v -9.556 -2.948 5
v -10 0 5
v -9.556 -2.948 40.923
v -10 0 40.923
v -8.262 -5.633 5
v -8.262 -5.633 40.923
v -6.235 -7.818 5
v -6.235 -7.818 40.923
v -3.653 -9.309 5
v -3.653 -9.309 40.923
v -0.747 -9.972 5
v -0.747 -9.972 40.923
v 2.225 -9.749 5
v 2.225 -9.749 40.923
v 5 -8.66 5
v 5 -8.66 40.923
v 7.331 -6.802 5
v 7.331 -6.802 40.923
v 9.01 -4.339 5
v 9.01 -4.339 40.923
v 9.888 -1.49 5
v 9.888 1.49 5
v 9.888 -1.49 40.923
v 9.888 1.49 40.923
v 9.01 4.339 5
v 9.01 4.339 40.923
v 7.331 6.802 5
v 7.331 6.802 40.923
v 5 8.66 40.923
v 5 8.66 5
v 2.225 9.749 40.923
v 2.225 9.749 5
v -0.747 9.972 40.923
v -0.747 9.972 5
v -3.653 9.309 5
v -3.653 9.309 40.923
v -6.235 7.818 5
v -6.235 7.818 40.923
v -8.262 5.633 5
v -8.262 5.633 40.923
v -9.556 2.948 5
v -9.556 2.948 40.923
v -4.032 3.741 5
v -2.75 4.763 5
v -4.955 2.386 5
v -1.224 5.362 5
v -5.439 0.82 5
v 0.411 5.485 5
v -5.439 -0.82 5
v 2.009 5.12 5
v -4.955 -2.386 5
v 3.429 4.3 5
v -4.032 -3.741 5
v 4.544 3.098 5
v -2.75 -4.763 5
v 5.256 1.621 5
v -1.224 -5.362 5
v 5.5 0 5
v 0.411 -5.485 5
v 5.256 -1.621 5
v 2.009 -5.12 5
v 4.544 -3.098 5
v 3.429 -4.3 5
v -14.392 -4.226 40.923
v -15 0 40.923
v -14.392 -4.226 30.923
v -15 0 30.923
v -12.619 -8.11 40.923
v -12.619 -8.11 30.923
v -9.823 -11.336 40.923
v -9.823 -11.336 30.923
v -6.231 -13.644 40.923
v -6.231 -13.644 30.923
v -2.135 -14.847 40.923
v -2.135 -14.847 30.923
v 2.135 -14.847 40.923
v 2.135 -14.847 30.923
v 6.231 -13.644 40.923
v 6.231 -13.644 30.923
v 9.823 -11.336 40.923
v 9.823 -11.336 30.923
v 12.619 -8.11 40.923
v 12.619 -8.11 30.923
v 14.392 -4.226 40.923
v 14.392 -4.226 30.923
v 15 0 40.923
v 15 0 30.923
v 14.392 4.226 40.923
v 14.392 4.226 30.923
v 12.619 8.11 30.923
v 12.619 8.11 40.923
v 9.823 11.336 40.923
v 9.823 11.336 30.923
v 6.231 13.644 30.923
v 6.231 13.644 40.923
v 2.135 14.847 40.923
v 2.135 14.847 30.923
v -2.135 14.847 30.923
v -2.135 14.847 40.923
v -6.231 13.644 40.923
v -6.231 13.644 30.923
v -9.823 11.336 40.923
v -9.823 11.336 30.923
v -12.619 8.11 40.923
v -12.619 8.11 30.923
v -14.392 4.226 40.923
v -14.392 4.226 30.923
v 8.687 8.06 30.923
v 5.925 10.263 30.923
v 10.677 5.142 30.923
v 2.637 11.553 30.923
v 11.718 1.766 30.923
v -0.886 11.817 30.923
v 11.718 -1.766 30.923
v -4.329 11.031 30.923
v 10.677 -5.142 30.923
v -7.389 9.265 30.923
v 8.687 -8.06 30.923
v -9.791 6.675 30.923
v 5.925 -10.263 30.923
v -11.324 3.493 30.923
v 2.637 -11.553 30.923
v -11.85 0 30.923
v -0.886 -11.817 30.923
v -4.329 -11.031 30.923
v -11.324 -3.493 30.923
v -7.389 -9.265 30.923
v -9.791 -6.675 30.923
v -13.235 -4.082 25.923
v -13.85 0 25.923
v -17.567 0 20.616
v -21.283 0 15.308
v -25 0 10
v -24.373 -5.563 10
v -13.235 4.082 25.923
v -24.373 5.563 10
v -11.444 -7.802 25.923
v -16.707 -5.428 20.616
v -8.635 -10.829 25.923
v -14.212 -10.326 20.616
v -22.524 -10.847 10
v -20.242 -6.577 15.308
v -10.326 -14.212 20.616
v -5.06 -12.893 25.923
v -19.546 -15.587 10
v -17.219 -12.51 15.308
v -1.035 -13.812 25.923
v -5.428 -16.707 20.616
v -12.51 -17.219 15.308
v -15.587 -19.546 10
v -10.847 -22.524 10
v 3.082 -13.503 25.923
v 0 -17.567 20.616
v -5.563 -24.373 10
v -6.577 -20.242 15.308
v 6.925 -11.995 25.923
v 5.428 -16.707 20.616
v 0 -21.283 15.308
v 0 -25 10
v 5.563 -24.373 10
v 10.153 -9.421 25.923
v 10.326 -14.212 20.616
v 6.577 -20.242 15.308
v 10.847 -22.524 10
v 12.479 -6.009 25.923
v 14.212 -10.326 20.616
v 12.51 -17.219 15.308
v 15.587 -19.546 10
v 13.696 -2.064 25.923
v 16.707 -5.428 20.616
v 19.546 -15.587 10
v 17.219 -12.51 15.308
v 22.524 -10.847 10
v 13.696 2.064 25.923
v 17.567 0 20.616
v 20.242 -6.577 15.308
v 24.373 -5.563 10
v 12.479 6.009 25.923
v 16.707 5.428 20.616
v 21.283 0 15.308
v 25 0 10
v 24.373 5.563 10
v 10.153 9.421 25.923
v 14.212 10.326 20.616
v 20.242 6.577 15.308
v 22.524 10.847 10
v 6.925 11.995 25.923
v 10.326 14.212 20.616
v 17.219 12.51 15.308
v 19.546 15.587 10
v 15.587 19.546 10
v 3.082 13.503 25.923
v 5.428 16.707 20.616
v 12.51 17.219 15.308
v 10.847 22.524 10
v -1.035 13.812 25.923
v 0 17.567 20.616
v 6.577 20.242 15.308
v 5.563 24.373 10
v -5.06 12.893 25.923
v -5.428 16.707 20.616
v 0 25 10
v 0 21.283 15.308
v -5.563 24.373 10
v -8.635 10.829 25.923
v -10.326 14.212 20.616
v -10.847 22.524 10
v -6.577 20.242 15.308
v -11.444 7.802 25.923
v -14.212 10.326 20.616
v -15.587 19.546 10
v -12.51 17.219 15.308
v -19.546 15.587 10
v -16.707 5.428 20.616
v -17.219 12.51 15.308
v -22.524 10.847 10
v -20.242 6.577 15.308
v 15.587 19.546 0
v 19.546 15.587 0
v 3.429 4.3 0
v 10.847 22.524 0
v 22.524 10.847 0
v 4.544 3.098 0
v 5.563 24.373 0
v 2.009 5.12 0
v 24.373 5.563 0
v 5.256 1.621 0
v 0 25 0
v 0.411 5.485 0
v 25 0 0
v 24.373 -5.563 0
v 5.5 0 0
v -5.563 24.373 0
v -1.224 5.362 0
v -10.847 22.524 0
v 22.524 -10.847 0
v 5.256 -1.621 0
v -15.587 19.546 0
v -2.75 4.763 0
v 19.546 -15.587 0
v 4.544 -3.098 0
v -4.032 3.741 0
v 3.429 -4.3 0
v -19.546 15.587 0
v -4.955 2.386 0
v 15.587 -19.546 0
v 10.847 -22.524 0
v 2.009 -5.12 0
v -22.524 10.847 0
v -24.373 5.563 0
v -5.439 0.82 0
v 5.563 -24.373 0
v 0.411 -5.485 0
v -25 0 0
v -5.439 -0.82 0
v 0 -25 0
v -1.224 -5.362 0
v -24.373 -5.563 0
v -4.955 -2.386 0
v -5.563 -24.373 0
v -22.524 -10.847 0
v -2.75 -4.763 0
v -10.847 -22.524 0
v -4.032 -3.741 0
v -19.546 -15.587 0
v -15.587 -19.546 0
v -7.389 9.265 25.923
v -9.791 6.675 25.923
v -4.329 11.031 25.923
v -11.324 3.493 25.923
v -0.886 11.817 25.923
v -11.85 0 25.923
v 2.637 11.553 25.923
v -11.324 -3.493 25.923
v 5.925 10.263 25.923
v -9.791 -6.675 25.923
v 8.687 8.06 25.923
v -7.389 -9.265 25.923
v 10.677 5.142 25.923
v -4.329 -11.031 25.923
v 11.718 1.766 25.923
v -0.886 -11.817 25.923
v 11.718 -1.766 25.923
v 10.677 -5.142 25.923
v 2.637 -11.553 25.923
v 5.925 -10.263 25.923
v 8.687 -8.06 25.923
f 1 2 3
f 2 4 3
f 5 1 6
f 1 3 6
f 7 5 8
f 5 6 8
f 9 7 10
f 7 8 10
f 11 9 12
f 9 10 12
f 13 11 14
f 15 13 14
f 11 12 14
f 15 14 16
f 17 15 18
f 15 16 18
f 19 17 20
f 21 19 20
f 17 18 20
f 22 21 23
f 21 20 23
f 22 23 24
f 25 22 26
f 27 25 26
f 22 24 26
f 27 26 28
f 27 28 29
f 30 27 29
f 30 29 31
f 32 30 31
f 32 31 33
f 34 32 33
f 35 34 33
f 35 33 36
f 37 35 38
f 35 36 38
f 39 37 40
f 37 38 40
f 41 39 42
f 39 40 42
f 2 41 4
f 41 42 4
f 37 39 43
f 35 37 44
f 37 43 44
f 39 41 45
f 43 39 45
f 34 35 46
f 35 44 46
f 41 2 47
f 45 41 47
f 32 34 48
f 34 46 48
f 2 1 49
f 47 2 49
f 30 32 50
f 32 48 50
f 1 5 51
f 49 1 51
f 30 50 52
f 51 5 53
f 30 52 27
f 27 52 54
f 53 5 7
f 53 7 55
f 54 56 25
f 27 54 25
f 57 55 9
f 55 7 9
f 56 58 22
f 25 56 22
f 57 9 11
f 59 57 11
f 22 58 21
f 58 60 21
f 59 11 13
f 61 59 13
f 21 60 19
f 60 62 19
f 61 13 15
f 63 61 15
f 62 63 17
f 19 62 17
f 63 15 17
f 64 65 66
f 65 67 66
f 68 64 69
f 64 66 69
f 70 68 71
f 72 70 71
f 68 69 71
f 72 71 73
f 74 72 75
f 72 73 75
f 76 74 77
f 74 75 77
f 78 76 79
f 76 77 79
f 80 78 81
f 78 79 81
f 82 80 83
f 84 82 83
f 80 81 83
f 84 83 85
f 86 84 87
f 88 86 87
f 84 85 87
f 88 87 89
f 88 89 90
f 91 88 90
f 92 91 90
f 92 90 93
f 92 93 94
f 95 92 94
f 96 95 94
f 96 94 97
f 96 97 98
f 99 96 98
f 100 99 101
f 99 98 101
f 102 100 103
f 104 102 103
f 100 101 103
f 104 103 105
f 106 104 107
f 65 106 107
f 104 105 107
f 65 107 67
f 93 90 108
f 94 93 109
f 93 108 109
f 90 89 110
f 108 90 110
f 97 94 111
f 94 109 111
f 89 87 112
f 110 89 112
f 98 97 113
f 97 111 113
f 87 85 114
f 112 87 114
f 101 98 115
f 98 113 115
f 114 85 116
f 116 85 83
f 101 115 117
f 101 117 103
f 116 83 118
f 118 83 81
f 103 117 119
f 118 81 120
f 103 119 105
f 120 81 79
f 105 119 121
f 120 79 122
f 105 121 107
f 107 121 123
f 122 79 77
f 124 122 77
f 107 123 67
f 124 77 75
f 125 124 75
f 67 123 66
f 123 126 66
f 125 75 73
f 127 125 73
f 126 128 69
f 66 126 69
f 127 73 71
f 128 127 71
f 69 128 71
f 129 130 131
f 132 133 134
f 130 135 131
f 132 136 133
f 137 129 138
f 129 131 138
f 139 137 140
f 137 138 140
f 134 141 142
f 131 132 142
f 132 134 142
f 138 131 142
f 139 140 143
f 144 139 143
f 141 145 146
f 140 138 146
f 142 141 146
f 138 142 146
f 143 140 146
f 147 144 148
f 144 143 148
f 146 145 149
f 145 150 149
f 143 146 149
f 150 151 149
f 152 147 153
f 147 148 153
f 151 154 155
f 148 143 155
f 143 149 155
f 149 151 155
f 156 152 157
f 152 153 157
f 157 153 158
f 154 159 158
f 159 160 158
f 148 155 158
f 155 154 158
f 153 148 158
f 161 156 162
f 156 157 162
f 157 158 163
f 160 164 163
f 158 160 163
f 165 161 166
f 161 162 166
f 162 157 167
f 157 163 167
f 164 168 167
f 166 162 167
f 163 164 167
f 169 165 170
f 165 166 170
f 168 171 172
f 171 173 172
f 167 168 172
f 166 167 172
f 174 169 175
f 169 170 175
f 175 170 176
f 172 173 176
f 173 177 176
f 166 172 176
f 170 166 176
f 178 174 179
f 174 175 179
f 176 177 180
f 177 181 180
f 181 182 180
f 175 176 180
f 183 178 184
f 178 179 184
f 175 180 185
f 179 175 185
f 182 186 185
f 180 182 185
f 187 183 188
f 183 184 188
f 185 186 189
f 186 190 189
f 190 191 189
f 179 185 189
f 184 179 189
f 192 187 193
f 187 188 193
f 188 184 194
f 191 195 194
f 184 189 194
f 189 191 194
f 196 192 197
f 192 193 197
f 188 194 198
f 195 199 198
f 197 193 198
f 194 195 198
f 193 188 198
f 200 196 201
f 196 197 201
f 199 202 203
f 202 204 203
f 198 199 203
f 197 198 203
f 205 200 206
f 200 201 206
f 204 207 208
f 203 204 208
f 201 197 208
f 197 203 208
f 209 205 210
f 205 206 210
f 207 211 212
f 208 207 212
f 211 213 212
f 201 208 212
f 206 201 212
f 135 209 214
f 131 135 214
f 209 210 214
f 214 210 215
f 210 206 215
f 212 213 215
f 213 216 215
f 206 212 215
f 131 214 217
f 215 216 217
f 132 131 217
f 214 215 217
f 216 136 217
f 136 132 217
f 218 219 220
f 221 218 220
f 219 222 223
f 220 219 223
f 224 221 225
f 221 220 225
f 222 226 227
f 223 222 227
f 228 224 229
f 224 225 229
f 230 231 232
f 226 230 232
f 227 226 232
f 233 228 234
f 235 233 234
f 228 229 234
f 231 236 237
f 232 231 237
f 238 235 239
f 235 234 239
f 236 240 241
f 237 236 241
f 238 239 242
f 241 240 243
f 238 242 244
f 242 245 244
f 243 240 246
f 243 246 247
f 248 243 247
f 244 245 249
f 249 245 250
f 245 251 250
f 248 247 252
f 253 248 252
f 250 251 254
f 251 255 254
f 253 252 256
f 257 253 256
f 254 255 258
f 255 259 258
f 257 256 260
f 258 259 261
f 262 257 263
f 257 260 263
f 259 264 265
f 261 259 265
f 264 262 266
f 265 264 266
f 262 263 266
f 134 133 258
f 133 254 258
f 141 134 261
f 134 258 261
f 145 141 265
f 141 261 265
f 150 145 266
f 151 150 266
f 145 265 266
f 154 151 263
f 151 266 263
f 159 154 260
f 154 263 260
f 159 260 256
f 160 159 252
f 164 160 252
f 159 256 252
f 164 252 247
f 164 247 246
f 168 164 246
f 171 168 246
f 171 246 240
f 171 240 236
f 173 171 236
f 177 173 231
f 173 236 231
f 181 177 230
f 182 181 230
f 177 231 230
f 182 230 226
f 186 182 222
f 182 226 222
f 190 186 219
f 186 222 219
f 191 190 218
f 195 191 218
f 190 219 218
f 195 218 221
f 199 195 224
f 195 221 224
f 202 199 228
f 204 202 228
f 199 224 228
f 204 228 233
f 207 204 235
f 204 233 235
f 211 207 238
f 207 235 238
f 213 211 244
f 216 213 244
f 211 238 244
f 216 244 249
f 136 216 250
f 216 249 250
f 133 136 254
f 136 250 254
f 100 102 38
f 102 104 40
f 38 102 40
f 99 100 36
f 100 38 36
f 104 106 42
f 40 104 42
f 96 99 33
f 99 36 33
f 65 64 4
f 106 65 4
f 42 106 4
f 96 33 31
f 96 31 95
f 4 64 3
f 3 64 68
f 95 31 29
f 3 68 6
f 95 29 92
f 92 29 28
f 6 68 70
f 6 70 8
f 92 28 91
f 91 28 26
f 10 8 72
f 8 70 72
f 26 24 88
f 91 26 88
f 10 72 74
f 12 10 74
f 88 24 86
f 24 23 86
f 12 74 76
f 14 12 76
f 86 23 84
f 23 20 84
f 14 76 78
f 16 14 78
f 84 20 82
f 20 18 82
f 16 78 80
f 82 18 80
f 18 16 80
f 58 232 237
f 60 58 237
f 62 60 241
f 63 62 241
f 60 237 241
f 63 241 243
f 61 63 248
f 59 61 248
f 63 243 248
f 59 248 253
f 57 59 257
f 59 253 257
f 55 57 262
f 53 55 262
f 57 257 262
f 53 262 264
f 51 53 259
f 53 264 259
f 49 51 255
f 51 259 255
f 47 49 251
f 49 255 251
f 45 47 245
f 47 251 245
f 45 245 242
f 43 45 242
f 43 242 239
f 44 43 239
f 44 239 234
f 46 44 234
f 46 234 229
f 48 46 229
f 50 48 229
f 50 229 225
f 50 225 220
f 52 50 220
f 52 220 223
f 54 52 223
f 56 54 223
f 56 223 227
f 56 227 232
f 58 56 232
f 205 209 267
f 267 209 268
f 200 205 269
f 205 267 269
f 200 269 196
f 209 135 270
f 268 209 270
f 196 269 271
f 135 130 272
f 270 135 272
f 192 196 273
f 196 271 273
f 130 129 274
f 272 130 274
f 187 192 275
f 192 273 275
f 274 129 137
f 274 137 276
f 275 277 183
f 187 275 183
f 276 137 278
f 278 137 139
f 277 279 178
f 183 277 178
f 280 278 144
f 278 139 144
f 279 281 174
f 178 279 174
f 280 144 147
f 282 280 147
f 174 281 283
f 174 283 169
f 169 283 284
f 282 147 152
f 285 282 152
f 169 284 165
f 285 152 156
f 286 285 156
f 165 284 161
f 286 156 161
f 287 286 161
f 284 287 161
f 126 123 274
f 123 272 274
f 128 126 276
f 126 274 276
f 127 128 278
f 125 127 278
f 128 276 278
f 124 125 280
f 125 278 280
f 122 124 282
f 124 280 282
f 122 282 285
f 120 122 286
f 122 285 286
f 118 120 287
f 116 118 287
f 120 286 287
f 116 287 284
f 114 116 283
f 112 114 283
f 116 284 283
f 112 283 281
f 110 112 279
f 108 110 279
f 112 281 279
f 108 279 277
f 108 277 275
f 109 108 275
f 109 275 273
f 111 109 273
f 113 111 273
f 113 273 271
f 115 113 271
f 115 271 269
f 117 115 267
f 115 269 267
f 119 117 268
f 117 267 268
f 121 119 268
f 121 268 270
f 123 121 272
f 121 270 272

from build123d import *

# Parameters (mm, degrees)
F2_R     = 5.5
F3_DEPTH = 25


with BuildPart() as f1:
    # F0 (on Front) → F1 (revolve)
    with BuildSketch(Plane.XZ):
        Polygon((-25, 0), (0, 0), (0, 5), (-10, 5), (-10, 40.923497), (-15, 40.923497), (-15, 30.923497), (-11.850247, 30.923497), (-11.850247, 25.923497), (-13.850247, 25.923497), (-25, 10), align=None)
    revolve(axis=Axis((0, 0, 25), (0, 0, 1)))

    # F2 (on face) → F3 (cut)
    with BuildSketch(Plane(origin=(0, 0, 0), x_dir=(1, 0, 0), z_dir=(0, 0, -1))):
        Circle(F2_R)
    extrude(amount=-F3_DEPTH, mode=Mode.SUBTRACT)


solid = f1.part
